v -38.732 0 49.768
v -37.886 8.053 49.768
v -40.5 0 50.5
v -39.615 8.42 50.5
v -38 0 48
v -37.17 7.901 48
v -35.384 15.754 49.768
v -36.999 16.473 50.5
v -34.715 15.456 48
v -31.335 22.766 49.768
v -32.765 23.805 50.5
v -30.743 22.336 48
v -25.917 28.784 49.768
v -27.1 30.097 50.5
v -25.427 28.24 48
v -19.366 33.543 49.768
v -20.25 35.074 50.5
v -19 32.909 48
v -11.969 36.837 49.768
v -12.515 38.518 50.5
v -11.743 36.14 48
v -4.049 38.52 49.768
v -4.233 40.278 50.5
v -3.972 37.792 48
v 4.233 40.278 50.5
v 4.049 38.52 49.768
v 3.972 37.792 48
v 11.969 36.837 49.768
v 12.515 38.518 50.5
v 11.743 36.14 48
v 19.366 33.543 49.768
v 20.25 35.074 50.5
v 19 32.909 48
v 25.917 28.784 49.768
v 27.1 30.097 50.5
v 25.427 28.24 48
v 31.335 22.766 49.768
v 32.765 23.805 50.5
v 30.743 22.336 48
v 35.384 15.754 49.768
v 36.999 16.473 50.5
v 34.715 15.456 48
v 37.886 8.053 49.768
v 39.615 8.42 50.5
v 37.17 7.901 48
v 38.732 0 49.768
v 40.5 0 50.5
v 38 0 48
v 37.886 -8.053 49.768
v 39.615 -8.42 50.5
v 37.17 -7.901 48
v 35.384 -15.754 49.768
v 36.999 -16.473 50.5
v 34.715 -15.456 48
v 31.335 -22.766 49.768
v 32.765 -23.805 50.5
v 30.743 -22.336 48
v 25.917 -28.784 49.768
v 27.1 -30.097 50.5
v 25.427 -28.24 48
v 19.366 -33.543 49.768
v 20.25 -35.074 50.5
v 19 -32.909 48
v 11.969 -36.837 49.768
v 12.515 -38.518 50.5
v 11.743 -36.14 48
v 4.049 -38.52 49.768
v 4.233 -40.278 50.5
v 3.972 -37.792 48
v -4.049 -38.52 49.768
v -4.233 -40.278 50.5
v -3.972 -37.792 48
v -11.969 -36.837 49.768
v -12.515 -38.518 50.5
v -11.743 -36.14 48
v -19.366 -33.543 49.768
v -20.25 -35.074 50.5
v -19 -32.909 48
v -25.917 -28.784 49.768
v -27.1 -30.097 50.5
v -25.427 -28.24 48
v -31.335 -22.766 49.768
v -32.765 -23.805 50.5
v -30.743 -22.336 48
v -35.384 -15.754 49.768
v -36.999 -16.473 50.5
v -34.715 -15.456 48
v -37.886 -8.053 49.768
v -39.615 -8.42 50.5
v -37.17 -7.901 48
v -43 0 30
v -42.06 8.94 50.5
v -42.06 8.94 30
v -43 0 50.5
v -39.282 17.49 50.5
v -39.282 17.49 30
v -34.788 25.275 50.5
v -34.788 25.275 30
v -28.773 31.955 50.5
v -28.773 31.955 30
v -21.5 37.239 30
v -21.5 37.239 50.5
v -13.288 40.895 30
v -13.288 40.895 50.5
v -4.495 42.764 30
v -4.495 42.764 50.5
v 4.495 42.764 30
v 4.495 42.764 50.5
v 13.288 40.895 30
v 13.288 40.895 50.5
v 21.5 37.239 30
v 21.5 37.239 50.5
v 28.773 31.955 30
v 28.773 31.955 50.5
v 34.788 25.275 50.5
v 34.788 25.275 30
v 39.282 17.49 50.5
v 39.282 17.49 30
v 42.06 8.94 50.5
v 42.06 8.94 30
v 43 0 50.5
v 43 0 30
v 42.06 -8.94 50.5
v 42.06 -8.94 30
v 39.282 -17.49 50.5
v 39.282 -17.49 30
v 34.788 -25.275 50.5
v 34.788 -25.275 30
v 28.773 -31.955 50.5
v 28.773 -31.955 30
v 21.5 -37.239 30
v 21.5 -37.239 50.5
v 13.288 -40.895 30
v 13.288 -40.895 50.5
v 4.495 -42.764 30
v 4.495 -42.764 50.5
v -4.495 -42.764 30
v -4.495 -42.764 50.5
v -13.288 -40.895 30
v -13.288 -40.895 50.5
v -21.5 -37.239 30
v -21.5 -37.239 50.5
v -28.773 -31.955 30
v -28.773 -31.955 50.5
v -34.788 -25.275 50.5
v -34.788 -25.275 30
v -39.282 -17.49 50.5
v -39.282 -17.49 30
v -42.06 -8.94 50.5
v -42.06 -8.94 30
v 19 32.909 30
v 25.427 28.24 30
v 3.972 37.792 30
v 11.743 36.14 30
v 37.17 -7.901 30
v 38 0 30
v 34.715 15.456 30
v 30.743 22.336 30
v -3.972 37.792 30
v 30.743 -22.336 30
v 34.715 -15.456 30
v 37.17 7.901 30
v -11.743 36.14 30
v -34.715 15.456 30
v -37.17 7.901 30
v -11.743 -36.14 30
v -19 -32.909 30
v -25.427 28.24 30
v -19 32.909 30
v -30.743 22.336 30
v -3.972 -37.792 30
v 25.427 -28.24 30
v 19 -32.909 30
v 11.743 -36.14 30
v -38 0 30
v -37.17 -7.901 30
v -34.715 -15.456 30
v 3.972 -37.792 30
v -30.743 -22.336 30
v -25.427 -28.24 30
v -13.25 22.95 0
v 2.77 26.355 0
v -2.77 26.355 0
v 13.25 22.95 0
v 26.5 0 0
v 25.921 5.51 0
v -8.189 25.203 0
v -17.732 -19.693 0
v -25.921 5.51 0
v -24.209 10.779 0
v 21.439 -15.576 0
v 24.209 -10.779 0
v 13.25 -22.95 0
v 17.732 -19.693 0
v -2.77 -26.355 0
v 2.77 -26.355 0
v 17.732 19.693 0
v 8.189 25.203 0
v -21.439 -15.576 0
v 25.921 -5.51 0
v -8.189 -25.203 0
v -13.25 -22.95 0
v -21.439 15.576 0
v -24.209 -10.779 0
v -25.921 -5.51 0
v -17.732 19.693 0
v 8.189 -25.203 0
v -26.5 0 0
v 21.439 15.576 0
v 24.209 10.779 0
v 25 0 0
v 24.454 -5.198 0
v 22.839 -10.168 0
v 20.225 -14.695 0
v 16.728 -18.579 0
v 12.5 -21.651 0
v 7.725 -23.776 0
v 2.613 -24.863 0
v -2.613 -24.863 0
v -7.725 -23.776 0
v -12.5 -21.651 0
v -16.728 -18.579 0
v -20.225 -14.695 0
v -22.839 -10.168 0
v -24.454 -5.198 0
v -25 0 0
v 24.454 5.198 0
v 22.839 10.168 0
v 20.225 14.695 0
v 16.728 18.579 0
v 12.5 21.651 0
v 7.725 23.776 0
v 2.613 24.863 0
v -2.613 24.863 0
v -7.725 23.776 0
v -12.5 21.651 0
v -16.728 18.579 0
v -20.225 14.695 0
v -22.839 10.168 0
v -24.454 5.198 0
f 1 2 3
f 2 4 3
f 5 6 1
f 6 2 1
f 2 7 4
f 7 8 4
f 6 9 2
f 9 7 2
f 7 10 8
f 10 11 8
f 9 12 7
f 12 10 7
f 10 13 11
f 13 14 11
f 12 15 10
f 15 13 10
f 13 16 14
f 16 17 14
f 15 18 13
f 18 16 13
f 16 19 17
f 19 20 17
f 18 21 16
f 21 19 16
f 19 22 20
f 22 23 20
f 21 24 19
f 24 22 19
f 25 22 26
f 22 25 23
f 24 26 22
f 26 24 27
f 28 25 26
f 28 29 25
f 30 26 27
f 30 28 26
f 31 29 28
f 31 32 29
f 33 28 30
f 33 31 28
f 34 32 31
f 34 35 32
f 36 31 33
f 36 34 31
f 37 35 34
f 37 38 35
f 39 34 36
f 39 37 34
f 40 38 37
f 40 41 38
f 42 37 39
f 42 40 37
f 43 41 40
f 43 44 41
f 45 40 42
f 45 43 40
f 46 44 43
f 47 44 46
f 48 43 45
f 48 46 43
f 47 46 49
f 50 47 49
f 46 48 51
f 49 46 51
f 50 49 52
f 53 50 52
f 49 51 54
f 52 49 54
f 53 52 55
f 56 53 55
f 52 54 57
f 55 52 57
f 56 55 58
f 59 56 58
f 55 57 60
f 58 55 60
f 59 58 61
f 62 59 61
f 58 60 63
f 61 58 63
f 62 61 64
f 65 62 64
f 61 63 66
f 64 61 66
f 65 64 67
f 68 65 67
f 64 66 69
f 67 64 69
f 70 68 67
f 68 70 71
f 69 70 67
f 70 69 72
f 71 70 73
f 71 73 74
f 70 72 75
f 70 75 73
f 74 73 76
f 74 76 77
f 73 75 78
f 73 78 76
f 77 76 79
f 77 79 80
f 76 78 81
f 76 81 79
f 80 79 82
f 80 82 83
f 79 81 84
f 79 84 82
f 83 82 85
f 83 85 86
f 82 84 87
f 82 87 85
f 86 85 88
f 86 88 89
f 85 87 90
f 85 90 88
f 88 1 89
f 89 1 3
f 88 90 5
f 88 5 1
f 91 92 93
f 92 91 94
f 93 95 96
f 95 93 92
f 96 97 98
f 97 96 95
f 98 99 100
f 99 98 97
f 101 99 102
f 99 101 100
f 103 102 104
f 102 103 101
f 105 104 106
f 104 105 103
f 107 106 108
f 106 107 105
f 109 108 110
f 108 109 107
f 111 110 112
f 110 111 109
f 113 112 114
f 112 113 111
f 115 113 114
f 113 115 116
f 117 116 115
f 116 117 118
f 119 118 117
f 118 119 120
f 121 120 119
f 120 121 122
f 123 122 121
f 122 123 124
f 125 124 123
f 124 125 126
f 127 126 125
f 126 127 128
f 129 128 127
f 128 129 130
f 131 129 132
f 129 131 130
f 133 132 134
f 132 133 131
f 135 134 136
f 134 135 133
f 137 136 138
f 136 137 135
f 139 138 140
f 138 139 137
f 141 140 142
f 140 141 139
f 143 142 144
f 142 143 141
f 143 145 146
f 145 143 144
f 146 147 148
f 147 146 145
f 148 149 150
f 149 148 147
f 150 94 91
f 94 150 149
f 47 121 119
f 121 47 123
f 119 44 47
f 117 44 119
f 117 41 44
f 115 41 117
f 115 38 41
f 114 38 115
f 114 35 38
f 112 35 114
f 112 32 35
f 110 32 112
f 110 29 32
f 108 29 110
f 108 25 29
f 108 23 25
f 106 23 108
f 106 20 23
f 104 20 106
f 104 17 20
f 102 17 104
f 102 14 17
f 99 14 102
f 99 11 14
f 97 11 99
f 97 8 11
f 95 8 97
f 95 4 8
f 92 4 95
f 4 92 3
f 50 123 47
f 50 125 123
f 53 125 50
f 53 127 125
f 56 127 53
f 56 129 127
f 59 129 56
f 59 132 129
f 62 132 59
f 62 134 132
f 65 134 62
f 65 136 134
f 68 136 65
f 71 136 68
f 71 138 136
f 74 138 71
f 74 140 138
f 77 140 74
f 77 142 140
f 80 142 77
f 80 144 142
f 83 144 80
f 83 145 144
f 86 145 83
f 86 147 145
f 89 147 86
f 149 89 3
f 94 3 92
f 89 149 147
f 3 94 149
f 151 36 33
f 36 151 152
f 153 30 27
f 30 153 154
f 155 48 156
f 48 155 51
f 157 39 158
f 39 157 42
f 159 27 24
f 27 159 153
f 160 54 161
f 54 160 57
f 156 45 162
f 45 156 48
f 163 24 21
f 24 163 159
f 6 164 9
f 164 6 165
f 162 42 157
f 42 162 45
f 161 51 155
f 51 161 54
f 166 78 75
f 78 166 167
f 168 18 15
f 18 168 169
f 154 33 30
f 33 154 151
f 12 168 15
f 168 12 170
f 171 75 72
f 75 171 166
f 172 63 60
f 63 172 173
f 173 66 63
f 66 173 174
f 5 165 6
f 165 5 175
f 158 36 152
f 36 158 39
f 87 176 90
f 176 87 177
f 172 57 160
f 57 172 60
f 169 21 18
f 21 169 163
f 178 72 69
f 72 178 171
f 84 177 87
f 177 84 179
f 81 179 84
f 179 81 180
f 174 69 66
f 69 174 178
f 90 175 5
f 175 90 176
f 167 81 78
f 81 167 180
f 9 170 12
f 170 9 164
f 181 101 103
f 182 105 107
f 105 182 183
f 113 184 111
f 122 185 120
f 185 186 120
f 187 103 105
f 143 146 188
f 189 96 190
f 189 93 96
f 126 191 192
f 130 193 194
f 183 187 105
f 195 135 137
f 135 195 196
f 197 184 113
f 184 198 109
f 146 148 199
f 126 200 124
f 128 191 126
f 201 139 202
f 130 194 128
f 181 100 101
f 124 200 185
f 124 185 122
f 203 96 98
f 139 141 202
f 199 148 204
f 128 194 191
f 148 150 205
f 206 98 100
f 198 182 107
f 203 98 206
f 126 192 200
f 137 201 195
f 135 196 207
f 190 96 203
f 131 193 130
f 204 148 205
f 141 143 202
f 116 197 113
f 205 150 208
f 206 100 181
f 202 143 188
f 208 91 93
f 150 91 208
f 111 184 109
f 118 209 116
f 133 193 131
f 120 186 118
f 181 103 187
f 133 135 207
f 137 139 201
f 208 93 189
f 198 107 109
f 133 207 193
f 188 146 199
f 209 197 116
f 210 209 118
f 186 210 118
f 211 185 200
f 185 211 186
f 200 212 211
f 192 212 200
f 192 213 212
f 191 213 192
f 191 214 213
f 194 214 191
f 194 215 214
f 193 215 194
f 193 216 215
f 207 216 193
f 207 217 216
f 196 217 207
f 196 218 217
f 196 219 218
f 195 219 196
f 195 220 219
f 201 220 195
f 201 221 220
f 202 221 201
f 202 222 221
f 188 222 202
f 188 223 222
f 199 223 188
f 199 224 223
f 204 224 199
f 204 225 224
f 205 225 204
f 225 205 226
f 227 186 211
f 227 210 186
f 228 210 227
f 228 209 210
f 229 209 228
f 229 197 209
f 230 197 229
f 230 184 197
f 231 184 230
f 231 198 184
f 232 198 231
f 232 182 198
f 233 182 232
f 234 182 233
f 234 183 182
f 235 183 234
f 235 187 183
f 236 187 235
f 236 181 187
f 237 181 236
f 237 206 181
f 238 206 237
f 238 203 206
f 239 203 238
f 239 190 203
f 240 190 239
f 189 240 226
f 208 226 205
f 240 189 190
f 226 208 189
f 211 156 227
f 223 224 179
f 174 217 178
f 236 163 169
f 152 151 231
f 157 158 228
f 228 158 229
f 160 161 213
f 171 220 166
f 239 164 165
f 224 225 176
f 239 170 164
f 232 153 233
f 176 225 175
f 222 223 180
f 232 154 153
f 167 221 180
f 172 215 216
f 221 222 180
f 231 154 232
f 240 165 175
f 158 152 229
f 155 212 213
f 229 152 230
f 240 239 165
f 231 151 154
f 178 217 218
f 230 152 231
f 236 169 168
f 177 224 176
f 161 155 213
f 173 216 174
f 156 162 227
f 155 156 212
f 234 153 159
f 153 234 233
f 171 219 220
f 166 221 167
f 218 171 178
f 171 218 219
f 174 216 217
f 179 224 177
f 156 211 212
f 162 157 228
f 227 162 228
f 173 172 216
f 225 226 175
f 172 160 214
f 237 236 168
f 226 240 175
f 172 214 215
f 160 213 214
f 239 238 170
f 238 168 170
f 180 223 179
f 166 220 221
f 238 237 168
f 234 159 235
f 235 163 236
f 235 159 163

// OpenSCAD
// $fa=1; $fs=0.5;

module bottle_connector()
{
    difference()
    {
        union()
        {
            translate([0,0,18])
            rotate_extrude(convexity=10)
            translate([40.5,0,0])
            circle(r=2.5);
            
            translate([0,0,18])
            rotate_extrude(convexity=10)
            translate([41.75,0,0])
            square(size=[2.5,5],center=true);
            
            cylinder(r=43,h=18);
        }
        cylinder(r=38,h=18);
    }
}

translate([0,0,30])
bottle_connector();

difference()
{
    cylinder(30,26.5,43);
    cylinder(30,25,38);
}
